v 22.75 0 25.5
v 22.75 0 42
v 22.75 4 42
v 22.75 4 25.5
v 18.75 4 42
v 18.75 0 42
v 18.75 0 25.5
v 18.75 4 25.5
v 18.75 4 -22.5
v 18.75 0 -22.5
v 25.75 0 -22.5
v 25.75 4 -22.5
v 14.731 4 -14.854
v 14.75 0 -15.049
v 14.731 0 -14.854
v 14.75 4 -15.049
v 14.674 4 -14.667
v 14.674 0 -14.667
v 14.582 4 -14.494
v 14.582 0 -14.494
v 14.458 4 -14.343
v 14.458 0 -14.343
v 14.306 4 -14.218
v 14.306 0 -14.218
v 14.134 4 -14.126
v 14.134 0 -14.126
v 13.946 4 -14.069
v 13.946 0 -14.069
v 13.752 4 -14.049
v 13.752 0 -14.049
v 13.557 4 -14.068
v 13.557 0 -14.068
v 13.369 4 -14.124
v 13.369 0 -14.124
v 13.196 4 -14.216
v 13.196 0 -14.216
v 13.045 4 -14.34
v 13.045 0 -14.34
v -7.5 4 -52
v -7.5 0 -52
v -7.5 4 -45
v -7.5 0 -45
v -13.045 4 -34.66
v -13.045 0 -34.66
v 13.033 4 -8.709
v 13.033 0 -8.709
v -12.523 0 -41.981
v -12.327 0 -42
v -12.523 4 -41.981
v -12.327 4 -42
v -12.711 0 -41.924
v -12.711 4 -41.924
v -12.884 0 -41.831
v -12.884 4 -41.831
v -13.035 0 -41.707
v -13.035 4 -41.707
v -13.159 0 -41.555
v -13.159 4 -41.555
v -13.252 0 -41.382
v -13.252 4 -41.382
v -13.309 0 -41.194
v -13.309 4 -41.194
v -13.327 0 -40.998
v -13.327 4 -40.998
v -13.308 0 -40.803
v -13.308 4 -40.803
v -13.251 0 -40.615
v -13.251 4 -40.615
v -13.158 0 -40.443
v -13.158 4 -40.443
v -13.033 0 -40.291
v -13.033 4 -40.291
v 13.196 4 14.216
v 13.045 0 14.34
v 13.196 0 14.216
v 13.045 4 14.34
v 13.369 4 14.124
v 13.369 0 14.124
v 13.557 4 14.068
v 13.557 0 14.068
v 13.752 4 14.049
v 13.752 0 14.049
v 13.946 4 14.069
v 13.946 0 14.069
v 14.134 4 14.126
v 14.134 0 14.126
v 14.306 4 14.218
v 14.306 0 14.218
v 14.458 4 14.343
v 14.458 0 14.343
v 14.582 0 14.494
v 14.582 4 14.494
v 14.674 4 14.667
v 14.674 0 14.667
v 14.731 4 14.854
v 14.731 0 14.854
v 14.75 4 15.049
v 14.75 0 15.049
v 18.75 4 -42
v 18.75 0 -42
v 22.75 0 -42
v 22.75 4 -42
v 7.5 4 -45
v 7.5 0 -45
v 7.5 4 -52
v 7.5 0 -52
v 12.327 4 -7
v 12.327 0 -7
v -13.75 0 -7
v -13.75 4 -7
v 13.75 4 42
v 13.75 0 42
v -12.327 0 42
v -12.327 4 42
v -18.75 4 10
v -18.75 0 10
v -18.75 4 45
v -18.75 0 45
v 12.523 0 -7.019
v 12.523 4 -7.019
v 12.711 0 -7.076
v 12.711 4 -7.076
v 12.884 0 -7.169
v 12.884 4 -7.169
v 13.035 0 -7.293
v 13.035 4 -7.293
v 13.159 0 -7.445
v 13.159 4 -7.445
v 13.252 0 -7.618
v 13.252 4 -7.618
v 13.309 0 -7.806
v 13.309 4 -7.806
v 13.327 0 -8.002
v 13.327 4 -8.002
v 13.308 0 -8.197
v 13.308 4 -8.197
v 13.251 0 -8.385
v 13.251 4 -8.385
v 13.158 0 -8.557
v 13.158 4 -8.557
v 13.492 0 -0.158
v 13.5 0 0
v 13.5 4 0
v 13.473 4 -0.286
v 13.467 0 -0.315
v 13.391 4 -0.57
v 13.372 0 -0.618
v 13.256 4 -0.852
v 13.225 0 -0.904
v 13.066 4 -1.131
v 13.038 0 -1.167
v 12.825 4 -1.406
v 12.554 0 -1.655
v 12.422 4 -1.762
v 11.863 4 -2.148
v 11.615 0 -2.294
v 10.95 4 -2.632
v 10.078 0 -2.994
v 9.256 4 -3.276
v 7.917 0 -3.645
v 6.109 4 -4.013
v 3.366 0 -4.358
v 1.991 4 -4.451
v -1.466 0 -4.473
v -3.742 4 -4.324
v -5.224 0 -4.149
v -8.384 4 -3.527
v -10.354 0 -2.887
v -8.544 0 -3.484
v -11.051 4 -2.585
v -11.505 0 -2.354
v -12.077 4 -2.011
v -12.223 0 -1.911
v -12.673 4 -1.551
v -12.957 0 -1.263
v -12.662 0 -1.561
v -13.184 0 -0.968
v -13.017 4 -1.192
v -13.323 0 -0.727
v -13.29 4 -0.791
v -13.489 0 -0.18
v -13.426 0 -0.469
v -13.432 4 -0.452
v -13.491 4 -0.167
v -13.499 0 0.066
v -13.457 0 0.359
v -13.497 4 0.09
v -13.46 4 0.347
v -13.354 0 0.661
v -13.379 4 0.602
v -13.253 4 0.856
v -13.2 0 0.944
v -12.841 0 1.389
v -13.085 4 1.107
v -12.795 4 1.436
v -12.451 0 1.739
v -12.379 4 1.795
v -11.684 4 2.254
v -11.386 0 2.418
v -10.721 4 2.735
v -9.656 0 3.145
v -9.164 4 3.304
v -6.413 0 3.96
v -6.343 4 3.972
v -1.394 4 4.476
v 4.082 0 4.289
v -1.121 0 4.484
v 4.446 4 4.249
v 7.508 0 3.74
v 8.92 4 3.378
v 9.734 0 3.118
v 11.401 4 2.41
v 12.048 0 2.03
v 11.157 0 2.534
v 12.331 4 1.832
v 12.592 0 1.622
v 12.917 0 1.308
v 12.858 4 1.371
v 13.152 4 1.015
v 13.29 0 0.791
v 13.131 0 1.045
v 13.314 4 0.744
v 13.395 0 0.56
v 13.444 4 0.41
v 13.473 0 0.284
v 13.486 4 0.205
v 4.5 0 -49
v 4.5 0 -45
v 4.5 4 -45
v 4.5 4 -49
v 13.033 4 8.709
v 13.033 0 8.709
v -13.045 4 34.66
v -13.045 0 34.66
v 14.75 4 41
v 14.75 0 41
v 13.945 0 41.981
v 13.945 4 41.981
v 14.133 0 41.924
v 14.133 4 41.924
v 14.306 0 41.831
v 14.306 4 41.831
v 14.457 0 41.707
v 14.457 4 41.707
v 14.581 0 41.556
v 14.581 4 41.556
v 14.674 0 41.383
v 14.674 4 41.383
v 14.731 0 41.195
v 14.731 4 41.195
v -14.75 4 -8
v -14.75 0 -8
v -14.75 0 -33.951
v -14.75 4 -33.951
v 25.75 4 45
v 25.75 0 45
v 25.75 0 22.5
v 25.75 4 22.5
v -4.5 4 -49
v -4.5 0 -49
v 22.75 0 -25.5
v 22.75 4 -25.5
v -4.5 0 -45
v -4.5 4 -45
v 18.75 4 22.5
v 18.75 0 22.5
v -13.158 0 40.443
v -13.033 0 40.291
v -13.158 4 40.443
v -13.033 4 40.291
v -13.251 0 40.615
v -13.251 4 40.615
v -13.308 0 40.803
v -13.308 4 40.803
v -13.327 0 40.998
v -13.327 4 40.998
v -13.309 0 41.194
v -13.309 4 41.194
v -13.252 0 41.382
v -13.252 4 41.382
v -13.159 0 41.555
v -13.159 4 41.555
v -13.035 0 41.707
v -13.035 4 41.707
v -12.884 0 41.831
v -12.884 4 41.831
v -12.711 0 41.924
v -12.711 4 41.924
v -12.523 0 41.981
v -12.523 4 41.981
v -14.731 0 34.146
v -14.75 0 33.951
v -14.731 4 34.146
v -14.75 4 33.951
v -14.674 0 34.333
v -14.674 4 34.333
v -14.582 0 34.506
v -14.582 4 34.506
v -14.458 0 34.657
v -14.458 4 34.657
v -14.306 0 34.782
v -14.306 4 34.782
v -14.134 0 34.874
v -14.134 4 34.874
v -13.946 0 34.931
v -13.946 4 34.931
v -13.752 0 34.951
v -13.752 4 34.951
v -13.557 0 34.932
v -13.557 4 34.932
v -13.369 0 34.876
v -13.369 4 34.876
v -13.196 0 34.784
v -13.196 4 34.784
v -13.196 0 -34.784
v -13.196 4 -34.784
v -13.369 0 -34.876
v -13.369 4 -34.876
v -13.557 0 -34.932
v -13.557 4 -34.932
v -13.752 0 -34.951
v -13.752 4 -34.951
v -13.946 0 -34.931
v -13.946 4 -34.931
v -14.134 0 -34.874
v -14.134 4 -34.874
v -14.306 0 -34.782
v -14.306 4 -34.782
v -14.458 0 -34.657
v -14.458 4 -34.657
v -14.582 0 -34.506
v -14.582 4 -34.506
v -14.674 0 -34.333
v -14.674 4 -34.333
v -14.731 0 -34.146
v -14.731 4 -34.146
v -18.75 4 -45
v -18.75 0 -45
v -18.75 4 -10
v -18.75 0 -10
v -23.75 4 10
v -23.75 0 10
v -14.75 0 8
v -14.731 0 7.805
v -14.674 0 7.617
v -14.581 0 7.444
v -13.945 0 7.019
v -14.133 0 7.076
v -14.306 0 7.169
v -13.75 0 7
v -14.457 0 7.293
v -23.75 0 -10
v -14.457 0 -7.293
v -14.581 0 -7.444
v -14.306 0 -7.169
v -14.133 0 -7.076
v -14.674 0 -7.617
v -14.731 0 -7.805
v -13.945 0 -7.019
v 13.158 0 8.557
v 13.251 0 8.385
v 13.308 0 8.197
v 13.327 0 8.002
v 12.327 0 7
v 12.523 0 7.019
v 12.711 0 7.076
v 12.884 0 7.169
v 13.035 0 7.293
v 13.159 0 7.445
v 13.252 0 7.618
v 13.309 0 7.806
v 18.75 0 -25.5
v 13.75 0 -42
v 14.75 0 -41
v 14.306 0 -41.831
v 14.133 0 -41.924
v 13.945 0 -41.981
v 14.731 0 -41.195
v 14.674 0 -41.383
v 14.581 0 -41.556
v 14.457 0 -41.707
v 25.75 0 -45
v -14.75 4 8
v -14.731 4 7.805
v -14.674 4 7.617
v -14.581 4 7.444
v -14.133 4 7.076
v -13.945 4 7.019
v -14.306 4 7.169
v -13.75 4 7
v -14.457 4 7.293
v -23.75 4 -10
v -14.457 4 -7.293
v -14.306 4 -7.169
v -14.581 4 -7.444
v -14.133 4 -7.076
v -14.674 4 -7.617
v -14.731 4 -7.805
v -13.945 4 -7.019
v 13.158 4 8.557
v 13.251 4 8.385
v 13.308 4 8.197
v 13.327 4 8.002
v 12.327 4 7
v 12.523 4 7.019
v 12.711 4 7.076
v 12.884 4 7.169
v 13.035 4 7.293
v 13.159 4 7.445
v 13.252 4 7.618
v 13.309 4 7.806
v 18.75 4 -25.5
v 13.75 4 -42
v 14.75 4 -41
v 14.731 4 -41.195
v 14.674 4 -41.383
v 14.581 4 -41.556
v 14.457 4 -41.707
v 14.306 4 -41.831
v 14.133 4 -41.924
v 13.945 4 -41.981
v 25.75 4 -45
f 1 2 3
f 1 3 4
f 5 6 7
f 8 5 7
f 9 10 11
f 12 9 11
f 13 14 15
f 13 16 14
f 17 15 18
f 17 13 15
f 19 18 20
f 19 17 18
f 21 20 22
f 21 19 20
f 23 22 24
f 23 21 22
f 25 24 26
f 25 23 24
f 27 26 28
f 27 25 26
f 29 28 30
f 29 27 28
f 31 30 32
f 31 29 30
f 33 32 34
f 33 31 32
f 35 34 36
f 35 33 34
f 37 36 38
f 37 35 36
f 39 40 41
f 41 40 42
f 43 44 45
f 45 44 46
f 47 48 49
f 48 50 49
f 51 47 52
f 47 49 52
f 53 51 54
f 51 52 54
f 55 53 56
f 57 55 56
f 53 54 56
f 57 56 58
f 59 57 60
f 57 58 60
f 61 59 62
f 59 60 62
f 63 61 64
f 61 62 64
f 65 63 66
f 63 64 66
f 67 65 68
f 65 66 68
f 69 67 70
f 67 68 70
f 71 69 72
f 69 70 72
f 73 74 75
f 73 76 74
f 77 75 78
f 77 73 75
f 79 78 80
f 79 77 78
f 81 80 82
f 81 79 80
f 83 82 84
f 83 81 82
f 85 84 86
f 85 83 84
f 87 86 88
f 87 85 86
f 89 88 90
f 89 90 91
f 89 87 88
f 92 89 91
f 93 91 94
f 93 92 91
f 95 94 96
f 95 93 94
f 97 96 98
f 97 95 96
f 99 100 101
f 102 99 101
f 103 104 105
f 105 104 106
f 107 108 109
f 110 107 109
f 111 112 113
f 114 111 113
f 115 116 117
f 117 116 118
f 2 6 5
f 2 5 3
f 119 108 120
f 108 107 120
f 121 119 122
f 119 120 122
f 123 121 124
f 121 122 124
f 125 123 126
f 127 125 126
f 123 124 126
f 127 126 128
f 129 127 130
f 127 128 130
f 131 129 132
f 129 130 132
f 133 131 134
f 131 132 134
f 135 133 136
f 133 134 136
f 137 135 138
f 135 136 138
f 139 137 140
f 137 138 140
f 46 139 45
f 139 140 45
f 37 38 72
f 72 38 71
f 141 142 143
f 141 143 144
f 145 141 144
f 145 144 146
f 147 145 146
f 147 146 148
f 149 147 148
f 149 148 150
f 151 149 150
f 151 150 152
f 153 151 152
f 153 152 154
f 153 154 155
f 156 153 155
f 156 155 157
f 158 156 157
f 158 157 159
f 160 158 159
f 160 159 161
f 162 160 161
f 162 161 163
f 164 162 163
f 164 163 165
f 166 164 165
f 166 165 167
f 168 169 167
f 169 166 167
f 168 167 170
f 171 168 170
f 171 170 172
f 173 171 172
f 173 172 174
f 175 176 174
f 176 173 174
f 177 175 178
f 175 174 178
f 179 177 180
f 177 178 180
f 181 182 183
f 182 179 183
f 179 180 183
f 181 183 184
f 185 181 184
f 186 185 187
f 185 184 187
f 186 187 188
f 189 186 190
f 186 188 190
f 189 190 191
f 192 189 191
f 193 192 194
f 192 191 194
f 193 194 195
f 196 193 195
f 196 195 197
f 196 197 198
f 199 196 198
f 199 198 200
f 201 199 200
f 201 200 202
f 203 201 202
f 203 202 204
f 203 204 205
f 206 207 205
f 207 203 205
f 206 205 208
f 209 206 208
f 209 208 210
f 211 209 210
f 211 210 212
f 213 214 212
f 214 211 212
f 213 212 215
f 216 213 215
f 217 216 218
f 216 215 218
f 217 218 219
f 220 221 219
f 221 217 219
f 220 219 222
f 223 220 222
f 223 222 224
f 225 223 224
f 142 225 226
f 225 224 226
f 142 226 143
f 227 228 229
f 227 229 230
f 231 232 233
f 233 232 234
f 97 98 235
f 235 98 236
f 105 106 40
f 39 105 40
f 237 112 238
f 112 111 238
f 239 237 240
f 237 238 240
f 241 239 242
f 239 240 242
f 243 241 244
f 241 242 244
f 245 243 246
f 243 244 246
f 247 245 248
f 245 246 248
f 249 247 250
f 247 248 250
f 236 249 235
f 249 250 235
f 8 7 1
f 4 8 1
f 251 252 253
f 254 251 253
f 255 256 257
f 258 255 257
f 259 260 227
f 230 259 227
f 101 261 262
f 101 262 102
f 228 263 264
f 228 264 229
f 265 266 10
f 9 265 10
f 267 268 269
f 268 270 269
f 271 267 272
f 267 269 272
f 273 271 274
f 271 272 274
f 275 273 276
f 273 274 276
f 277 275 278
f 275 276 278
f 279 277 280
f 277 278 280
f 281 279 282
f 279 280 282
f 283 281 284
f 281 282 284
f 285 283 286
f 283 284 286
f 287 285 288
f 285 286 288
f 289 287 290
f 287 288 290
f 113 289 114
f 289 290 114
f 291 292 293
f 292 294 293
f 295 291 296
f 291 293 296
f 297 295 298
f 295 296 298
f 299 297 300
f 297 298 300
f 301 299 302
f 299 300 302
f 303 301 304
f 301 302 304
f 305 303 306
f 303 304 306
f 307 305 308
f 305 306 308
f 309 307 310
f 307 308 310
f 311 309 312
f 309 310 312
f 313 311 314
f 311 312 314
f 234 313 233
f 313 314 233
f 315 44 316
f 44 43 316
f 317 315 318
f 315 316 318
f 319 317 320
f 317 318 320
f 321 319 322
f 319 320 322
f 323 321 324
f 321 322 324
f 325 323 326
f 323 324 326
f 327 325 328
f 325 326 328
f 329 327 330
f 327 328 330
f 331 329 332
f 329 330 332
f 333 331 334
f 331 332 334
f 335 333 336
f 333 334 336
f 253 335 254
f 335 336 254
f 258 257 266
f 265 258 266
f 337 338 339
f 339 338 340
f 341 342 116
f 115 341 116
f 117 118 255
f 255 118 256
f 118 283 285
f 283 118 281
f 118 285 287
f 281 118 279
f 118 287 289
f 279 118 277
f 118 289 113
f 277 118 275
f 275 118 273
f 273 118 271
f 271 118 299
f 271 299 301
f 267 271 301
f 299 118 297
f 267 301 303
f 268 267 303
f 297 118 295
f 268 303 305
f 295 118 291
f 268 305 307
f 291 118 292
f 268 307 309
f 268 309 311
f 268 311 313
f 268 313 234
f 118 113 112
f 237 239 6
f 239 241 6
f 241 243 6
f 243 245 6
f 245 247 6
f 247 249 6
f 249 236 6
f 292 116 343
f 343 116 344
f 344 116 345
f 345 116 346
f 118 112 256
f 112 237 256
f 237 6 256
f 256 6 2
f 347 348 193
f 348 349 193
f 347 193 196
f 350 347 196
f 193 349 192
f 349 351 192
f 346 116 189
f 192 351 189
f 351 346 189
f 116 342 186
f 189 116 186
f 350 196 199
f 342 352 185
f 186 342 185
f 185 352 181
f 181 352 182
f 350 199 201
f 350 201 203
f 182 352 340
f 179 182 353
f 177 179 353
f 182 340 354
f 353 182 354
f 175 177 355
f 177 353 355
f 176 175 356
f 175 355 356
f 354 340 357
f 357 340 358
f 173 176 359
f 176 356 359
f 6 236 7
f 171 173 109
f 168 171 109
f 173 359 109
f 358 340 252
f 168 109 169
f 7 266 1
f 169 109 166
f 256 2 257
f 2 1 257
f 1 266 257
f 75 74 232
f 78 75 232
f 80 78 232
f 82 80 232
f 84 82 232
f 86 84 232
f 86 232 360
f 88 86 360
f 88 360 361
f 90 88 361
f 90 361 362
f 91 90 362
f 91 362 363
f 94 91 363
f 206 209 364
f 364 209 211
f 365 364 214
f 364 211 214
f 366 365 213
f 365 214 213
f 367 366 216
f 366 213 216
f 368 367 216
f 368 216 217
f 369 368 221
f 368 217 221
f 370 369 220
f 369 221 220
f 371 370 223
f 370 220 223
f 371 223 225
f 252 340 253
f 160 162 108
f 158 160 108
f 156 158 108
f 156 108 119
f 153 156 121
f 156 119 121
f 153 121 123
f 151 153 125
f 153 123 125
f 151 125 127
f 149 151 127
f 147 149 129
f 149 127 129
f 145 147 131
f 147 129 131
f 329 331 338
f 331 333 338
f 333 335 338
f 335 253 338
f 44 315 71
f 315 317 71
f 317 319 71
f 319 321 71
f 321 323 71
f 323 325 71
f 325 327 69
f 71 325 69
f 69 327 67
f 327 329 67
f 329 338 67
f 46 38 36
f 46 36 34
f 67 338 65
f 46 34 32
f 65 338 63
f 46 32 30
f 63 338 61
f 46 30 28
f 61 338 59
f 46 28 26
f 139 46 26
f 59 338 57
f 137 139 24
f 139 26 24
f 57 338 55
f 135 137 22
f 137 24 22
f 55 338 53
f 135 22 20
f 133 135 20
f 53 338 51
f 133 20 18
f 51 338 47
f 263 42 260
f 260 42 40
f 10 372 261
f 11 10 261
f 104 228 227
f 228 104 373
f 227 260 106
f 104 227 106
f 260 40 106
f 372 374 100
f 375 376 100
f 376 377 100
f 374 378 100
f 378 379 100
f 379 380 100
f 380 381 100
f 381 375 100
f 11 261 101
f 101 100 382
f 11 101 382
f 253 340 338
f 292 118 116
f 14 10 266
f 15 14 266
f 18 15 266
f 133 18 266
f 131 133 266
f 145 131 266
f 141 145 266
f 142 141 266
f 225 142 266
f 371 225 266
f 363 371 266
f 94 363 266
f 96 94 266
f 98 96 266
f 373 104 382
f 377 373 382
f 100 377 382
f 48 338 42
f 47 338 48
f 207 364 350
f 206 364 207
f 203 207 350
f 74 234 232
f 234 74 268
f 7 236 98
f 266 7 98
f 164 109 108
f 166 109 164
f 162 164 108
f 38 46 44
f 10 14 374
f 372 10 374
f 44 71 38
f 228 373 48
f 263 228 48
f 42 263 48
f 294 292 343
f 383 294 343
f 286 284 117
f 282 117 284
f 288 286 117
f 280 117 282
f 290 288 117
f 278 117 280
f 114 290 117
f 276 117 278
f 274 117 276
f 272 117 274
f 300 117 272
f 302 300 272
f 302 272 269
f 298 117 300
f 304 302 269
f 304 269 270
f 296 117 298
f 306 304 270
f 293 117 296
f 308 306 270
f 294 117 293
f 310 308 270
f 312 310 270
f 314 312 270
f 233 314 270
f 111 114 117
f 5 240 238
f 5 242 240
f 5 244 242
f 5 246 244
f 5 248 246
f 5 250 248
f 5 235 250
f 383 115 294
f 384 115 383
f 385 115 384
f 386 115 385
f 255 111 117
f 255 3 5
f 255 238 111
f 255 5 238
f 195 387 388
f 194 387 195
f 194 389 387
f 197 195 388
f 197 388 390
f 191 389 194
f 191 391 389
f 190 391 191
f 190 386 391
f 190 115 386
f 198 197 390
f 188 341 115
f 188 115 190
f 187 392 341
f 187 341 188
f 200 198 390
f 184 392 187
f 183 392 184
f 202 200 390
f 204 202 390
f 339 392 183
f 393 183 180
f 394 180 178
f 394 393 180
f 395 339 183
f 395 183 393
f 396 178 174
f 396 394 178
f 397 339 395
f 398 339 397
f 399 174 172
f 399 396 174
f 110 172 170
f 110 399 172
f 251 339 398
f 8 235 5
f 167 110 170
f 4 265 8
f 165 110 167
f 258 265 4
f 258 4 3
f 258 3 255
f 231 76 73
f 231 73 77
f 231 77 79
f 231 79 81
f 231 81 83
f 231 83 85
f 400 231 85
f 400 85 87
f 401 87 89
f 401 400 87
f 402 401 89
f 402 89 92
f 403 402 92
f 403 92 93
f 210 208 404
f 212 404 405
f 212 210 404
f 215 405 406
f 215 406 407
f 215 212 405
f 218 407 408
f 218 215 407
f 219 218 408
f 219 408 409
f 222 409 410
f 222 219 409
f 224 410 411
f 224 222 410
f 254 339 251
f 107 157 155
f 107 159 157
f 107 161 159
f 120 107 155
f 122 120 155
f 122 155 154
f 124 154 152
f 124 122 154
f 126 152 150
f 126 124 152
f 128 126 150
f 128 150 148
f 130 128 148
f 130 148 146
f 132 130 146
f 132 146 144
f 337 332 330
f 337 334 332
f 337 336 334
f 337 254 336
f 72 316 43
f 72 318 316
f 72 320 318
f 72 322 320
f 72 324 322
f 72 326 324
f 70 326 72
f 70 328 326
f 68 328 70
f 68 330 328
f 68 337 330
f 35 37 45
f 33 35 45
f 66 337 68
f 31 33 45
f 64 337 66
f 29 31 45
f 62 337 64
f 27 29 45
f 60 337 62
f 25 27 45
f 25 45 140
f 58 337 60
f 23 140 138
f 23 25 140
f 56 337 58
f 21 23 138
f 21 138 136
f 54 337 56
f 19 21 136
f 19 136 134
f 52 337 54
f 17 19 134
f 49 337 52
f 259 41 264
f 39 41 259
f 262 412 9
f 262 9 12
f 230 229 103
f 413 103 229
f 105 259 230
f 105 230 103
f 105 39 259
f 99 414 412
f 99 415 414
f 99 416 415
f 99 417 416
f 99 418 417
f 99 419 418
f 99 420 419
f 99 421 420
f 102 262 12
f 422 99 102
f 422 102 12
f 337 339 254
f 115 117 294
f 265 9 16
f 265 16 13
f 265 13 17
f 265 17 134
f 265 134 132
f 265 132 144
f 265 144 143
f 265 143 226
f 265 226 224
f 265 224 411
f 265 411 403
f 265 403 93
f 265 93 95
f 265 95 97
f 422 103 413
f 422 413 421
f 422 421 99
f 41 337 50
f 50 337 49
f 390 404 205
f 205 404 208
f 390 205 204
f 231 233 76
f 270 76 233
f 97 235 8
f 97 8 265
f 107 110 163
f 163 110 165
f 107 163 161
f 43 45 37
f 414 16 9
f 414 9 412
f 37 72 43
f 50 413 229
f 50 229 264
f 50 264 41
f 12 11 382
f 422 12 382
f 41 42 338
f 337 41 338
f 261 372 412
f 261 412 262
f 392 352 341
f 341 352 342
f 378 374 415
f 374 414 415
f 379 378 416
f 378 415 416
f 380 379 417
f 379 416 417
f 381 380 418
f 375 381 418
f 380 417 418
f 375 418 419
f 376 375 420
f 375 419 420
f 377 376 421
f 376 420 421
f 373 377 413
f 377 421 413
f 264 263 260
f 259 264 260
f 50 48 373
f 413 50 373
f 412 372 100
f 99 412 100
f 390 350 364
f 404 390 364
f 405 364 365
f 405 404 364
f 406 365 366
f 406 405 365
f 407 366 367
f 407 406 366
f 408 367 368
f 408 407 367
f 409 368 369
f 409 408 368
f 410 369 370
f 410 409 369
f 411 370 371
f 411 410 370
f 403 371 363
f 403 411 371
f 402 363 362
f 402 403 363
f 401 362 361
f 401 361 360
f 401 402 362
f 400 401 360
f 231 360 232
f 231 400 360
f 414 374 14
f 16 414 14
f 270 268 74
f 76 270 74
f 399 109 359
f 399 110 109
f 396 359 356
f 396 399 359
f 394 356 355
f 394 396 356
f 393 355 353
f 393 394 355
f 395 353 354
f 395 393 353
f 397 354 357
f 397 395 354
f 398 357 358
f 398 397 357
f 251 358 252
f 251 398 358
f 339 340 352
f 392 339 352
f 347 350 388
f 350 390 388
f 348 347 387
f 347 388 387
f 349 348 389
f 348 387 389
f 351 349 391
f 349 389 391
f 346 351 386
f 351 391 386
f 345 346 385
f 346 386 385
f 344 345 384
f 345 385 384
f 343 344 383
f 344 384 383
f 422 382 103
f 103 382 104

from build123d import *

# Parameters (mm, degrees)
SKETCH1_W           = 4
SKETCH1_H           = 16.5
SKETCH1_W_2         = 9
SKETCH1_H_2         = 4
BOSS_EXTRUDE1_DEPTH = 4
FILLET1_R           = 1
SKETCH2_RX          = 13.5
SKETCH2_RY          = 4.5
CUT_EXTRUDE1_DEPTH  = 59.164099752


with BuildPart() as part:
    # Sketch1 → Boss-Extrude1 (new body)
    with BuildSketch(Plane(origin=(0, 0, 0), x_dir=(1, 0, 0), z_dir=(0, 1, 0))):
        Polygon((-18.75, 45), (-18.75, 10), (-23.75, 10), (-23.75, -10), (-18.75, -10), (-18.75, -45), (25.75, -45), (25.75, -22.5), (18.75, -22.5), (18.75, 22.5), (25.75, 22.5), (25.75, 45), (7.5, 45), (7.5, 52), (-7.5, 52), (-7.5, 45), align=None)
        with Locations((20.75, 33.75)):
            Rectangle(SKETCH1_W, SKETCH1_H, mode=Mode.SUBTRACT)
        with Locations((20.75, -33.75)):
            Rectangle(SKETCH1_W, SKETCH1_H, mode=Mode.SUBTRACT)
        with Locations((0, 47)):
            Rectangle(SKETCH1_W_2, SKETCH1_H_2, mode=Mode.SUBTRACT)
        Polygon((-14.75, 7), (-14.75, 36.356853762), (14.75, 7), align=None, mode=Mode.SUBTRACT)
        Polygon((14.75, 12.643146238), (-14.75, 42), (14.75, 42), align=None, mode=Mode.SUBTRACT)
        Polygon((14.75, -7), (-14.75, -36.356853762), (-14.75, -7), align=None, mode=Mode.SUBTRACT)
        Polygon((14.75, -12.643146238), (14.75, -42), (-14.75, -42), align=None, mode=Mode.SUBTRACT)
    extrude(amount=BOSS_EXTRUDE1_DEPTH)

    # Fillet1
    fillet1_edges = [part.edges().sort_by_distance(p)[0] for p in [
        (-14.75, 2, 42),
        (14.75, 2, 42),
        (14.75, 2, 12.643146238),
        (-14.75, 2, 36.356853762),
        (14.75, 2, 7),
        (-14.75, 2, 7),
        (14.75, 2, -42),
        (-14.75, 2, -42),
        (14.75, 2, -12.643146238),
        (14.75, 2, -7),
        (-14.75, 2, -36.356853762),
        (-14.75, 2, -7),
    ]]
    fillet(fillet1_edges, radius=FILLET1_R)

    # Sketch2 → Cut-Extrude1 (cut, through all)
    with BuildSketch(Plane(origin=(0, 4, 0), x_dir=(1, 0, 0), z_dir=(0, 1, 0))):
        with Locations((0, 0)):
            Ellipse(SKETCH2_RX, SKETCH2_RY)
    extrude(amount=-CUT_EXTRUDE1_DEPTH, mode=Mode.SUBTRACT)


solid = part.part
